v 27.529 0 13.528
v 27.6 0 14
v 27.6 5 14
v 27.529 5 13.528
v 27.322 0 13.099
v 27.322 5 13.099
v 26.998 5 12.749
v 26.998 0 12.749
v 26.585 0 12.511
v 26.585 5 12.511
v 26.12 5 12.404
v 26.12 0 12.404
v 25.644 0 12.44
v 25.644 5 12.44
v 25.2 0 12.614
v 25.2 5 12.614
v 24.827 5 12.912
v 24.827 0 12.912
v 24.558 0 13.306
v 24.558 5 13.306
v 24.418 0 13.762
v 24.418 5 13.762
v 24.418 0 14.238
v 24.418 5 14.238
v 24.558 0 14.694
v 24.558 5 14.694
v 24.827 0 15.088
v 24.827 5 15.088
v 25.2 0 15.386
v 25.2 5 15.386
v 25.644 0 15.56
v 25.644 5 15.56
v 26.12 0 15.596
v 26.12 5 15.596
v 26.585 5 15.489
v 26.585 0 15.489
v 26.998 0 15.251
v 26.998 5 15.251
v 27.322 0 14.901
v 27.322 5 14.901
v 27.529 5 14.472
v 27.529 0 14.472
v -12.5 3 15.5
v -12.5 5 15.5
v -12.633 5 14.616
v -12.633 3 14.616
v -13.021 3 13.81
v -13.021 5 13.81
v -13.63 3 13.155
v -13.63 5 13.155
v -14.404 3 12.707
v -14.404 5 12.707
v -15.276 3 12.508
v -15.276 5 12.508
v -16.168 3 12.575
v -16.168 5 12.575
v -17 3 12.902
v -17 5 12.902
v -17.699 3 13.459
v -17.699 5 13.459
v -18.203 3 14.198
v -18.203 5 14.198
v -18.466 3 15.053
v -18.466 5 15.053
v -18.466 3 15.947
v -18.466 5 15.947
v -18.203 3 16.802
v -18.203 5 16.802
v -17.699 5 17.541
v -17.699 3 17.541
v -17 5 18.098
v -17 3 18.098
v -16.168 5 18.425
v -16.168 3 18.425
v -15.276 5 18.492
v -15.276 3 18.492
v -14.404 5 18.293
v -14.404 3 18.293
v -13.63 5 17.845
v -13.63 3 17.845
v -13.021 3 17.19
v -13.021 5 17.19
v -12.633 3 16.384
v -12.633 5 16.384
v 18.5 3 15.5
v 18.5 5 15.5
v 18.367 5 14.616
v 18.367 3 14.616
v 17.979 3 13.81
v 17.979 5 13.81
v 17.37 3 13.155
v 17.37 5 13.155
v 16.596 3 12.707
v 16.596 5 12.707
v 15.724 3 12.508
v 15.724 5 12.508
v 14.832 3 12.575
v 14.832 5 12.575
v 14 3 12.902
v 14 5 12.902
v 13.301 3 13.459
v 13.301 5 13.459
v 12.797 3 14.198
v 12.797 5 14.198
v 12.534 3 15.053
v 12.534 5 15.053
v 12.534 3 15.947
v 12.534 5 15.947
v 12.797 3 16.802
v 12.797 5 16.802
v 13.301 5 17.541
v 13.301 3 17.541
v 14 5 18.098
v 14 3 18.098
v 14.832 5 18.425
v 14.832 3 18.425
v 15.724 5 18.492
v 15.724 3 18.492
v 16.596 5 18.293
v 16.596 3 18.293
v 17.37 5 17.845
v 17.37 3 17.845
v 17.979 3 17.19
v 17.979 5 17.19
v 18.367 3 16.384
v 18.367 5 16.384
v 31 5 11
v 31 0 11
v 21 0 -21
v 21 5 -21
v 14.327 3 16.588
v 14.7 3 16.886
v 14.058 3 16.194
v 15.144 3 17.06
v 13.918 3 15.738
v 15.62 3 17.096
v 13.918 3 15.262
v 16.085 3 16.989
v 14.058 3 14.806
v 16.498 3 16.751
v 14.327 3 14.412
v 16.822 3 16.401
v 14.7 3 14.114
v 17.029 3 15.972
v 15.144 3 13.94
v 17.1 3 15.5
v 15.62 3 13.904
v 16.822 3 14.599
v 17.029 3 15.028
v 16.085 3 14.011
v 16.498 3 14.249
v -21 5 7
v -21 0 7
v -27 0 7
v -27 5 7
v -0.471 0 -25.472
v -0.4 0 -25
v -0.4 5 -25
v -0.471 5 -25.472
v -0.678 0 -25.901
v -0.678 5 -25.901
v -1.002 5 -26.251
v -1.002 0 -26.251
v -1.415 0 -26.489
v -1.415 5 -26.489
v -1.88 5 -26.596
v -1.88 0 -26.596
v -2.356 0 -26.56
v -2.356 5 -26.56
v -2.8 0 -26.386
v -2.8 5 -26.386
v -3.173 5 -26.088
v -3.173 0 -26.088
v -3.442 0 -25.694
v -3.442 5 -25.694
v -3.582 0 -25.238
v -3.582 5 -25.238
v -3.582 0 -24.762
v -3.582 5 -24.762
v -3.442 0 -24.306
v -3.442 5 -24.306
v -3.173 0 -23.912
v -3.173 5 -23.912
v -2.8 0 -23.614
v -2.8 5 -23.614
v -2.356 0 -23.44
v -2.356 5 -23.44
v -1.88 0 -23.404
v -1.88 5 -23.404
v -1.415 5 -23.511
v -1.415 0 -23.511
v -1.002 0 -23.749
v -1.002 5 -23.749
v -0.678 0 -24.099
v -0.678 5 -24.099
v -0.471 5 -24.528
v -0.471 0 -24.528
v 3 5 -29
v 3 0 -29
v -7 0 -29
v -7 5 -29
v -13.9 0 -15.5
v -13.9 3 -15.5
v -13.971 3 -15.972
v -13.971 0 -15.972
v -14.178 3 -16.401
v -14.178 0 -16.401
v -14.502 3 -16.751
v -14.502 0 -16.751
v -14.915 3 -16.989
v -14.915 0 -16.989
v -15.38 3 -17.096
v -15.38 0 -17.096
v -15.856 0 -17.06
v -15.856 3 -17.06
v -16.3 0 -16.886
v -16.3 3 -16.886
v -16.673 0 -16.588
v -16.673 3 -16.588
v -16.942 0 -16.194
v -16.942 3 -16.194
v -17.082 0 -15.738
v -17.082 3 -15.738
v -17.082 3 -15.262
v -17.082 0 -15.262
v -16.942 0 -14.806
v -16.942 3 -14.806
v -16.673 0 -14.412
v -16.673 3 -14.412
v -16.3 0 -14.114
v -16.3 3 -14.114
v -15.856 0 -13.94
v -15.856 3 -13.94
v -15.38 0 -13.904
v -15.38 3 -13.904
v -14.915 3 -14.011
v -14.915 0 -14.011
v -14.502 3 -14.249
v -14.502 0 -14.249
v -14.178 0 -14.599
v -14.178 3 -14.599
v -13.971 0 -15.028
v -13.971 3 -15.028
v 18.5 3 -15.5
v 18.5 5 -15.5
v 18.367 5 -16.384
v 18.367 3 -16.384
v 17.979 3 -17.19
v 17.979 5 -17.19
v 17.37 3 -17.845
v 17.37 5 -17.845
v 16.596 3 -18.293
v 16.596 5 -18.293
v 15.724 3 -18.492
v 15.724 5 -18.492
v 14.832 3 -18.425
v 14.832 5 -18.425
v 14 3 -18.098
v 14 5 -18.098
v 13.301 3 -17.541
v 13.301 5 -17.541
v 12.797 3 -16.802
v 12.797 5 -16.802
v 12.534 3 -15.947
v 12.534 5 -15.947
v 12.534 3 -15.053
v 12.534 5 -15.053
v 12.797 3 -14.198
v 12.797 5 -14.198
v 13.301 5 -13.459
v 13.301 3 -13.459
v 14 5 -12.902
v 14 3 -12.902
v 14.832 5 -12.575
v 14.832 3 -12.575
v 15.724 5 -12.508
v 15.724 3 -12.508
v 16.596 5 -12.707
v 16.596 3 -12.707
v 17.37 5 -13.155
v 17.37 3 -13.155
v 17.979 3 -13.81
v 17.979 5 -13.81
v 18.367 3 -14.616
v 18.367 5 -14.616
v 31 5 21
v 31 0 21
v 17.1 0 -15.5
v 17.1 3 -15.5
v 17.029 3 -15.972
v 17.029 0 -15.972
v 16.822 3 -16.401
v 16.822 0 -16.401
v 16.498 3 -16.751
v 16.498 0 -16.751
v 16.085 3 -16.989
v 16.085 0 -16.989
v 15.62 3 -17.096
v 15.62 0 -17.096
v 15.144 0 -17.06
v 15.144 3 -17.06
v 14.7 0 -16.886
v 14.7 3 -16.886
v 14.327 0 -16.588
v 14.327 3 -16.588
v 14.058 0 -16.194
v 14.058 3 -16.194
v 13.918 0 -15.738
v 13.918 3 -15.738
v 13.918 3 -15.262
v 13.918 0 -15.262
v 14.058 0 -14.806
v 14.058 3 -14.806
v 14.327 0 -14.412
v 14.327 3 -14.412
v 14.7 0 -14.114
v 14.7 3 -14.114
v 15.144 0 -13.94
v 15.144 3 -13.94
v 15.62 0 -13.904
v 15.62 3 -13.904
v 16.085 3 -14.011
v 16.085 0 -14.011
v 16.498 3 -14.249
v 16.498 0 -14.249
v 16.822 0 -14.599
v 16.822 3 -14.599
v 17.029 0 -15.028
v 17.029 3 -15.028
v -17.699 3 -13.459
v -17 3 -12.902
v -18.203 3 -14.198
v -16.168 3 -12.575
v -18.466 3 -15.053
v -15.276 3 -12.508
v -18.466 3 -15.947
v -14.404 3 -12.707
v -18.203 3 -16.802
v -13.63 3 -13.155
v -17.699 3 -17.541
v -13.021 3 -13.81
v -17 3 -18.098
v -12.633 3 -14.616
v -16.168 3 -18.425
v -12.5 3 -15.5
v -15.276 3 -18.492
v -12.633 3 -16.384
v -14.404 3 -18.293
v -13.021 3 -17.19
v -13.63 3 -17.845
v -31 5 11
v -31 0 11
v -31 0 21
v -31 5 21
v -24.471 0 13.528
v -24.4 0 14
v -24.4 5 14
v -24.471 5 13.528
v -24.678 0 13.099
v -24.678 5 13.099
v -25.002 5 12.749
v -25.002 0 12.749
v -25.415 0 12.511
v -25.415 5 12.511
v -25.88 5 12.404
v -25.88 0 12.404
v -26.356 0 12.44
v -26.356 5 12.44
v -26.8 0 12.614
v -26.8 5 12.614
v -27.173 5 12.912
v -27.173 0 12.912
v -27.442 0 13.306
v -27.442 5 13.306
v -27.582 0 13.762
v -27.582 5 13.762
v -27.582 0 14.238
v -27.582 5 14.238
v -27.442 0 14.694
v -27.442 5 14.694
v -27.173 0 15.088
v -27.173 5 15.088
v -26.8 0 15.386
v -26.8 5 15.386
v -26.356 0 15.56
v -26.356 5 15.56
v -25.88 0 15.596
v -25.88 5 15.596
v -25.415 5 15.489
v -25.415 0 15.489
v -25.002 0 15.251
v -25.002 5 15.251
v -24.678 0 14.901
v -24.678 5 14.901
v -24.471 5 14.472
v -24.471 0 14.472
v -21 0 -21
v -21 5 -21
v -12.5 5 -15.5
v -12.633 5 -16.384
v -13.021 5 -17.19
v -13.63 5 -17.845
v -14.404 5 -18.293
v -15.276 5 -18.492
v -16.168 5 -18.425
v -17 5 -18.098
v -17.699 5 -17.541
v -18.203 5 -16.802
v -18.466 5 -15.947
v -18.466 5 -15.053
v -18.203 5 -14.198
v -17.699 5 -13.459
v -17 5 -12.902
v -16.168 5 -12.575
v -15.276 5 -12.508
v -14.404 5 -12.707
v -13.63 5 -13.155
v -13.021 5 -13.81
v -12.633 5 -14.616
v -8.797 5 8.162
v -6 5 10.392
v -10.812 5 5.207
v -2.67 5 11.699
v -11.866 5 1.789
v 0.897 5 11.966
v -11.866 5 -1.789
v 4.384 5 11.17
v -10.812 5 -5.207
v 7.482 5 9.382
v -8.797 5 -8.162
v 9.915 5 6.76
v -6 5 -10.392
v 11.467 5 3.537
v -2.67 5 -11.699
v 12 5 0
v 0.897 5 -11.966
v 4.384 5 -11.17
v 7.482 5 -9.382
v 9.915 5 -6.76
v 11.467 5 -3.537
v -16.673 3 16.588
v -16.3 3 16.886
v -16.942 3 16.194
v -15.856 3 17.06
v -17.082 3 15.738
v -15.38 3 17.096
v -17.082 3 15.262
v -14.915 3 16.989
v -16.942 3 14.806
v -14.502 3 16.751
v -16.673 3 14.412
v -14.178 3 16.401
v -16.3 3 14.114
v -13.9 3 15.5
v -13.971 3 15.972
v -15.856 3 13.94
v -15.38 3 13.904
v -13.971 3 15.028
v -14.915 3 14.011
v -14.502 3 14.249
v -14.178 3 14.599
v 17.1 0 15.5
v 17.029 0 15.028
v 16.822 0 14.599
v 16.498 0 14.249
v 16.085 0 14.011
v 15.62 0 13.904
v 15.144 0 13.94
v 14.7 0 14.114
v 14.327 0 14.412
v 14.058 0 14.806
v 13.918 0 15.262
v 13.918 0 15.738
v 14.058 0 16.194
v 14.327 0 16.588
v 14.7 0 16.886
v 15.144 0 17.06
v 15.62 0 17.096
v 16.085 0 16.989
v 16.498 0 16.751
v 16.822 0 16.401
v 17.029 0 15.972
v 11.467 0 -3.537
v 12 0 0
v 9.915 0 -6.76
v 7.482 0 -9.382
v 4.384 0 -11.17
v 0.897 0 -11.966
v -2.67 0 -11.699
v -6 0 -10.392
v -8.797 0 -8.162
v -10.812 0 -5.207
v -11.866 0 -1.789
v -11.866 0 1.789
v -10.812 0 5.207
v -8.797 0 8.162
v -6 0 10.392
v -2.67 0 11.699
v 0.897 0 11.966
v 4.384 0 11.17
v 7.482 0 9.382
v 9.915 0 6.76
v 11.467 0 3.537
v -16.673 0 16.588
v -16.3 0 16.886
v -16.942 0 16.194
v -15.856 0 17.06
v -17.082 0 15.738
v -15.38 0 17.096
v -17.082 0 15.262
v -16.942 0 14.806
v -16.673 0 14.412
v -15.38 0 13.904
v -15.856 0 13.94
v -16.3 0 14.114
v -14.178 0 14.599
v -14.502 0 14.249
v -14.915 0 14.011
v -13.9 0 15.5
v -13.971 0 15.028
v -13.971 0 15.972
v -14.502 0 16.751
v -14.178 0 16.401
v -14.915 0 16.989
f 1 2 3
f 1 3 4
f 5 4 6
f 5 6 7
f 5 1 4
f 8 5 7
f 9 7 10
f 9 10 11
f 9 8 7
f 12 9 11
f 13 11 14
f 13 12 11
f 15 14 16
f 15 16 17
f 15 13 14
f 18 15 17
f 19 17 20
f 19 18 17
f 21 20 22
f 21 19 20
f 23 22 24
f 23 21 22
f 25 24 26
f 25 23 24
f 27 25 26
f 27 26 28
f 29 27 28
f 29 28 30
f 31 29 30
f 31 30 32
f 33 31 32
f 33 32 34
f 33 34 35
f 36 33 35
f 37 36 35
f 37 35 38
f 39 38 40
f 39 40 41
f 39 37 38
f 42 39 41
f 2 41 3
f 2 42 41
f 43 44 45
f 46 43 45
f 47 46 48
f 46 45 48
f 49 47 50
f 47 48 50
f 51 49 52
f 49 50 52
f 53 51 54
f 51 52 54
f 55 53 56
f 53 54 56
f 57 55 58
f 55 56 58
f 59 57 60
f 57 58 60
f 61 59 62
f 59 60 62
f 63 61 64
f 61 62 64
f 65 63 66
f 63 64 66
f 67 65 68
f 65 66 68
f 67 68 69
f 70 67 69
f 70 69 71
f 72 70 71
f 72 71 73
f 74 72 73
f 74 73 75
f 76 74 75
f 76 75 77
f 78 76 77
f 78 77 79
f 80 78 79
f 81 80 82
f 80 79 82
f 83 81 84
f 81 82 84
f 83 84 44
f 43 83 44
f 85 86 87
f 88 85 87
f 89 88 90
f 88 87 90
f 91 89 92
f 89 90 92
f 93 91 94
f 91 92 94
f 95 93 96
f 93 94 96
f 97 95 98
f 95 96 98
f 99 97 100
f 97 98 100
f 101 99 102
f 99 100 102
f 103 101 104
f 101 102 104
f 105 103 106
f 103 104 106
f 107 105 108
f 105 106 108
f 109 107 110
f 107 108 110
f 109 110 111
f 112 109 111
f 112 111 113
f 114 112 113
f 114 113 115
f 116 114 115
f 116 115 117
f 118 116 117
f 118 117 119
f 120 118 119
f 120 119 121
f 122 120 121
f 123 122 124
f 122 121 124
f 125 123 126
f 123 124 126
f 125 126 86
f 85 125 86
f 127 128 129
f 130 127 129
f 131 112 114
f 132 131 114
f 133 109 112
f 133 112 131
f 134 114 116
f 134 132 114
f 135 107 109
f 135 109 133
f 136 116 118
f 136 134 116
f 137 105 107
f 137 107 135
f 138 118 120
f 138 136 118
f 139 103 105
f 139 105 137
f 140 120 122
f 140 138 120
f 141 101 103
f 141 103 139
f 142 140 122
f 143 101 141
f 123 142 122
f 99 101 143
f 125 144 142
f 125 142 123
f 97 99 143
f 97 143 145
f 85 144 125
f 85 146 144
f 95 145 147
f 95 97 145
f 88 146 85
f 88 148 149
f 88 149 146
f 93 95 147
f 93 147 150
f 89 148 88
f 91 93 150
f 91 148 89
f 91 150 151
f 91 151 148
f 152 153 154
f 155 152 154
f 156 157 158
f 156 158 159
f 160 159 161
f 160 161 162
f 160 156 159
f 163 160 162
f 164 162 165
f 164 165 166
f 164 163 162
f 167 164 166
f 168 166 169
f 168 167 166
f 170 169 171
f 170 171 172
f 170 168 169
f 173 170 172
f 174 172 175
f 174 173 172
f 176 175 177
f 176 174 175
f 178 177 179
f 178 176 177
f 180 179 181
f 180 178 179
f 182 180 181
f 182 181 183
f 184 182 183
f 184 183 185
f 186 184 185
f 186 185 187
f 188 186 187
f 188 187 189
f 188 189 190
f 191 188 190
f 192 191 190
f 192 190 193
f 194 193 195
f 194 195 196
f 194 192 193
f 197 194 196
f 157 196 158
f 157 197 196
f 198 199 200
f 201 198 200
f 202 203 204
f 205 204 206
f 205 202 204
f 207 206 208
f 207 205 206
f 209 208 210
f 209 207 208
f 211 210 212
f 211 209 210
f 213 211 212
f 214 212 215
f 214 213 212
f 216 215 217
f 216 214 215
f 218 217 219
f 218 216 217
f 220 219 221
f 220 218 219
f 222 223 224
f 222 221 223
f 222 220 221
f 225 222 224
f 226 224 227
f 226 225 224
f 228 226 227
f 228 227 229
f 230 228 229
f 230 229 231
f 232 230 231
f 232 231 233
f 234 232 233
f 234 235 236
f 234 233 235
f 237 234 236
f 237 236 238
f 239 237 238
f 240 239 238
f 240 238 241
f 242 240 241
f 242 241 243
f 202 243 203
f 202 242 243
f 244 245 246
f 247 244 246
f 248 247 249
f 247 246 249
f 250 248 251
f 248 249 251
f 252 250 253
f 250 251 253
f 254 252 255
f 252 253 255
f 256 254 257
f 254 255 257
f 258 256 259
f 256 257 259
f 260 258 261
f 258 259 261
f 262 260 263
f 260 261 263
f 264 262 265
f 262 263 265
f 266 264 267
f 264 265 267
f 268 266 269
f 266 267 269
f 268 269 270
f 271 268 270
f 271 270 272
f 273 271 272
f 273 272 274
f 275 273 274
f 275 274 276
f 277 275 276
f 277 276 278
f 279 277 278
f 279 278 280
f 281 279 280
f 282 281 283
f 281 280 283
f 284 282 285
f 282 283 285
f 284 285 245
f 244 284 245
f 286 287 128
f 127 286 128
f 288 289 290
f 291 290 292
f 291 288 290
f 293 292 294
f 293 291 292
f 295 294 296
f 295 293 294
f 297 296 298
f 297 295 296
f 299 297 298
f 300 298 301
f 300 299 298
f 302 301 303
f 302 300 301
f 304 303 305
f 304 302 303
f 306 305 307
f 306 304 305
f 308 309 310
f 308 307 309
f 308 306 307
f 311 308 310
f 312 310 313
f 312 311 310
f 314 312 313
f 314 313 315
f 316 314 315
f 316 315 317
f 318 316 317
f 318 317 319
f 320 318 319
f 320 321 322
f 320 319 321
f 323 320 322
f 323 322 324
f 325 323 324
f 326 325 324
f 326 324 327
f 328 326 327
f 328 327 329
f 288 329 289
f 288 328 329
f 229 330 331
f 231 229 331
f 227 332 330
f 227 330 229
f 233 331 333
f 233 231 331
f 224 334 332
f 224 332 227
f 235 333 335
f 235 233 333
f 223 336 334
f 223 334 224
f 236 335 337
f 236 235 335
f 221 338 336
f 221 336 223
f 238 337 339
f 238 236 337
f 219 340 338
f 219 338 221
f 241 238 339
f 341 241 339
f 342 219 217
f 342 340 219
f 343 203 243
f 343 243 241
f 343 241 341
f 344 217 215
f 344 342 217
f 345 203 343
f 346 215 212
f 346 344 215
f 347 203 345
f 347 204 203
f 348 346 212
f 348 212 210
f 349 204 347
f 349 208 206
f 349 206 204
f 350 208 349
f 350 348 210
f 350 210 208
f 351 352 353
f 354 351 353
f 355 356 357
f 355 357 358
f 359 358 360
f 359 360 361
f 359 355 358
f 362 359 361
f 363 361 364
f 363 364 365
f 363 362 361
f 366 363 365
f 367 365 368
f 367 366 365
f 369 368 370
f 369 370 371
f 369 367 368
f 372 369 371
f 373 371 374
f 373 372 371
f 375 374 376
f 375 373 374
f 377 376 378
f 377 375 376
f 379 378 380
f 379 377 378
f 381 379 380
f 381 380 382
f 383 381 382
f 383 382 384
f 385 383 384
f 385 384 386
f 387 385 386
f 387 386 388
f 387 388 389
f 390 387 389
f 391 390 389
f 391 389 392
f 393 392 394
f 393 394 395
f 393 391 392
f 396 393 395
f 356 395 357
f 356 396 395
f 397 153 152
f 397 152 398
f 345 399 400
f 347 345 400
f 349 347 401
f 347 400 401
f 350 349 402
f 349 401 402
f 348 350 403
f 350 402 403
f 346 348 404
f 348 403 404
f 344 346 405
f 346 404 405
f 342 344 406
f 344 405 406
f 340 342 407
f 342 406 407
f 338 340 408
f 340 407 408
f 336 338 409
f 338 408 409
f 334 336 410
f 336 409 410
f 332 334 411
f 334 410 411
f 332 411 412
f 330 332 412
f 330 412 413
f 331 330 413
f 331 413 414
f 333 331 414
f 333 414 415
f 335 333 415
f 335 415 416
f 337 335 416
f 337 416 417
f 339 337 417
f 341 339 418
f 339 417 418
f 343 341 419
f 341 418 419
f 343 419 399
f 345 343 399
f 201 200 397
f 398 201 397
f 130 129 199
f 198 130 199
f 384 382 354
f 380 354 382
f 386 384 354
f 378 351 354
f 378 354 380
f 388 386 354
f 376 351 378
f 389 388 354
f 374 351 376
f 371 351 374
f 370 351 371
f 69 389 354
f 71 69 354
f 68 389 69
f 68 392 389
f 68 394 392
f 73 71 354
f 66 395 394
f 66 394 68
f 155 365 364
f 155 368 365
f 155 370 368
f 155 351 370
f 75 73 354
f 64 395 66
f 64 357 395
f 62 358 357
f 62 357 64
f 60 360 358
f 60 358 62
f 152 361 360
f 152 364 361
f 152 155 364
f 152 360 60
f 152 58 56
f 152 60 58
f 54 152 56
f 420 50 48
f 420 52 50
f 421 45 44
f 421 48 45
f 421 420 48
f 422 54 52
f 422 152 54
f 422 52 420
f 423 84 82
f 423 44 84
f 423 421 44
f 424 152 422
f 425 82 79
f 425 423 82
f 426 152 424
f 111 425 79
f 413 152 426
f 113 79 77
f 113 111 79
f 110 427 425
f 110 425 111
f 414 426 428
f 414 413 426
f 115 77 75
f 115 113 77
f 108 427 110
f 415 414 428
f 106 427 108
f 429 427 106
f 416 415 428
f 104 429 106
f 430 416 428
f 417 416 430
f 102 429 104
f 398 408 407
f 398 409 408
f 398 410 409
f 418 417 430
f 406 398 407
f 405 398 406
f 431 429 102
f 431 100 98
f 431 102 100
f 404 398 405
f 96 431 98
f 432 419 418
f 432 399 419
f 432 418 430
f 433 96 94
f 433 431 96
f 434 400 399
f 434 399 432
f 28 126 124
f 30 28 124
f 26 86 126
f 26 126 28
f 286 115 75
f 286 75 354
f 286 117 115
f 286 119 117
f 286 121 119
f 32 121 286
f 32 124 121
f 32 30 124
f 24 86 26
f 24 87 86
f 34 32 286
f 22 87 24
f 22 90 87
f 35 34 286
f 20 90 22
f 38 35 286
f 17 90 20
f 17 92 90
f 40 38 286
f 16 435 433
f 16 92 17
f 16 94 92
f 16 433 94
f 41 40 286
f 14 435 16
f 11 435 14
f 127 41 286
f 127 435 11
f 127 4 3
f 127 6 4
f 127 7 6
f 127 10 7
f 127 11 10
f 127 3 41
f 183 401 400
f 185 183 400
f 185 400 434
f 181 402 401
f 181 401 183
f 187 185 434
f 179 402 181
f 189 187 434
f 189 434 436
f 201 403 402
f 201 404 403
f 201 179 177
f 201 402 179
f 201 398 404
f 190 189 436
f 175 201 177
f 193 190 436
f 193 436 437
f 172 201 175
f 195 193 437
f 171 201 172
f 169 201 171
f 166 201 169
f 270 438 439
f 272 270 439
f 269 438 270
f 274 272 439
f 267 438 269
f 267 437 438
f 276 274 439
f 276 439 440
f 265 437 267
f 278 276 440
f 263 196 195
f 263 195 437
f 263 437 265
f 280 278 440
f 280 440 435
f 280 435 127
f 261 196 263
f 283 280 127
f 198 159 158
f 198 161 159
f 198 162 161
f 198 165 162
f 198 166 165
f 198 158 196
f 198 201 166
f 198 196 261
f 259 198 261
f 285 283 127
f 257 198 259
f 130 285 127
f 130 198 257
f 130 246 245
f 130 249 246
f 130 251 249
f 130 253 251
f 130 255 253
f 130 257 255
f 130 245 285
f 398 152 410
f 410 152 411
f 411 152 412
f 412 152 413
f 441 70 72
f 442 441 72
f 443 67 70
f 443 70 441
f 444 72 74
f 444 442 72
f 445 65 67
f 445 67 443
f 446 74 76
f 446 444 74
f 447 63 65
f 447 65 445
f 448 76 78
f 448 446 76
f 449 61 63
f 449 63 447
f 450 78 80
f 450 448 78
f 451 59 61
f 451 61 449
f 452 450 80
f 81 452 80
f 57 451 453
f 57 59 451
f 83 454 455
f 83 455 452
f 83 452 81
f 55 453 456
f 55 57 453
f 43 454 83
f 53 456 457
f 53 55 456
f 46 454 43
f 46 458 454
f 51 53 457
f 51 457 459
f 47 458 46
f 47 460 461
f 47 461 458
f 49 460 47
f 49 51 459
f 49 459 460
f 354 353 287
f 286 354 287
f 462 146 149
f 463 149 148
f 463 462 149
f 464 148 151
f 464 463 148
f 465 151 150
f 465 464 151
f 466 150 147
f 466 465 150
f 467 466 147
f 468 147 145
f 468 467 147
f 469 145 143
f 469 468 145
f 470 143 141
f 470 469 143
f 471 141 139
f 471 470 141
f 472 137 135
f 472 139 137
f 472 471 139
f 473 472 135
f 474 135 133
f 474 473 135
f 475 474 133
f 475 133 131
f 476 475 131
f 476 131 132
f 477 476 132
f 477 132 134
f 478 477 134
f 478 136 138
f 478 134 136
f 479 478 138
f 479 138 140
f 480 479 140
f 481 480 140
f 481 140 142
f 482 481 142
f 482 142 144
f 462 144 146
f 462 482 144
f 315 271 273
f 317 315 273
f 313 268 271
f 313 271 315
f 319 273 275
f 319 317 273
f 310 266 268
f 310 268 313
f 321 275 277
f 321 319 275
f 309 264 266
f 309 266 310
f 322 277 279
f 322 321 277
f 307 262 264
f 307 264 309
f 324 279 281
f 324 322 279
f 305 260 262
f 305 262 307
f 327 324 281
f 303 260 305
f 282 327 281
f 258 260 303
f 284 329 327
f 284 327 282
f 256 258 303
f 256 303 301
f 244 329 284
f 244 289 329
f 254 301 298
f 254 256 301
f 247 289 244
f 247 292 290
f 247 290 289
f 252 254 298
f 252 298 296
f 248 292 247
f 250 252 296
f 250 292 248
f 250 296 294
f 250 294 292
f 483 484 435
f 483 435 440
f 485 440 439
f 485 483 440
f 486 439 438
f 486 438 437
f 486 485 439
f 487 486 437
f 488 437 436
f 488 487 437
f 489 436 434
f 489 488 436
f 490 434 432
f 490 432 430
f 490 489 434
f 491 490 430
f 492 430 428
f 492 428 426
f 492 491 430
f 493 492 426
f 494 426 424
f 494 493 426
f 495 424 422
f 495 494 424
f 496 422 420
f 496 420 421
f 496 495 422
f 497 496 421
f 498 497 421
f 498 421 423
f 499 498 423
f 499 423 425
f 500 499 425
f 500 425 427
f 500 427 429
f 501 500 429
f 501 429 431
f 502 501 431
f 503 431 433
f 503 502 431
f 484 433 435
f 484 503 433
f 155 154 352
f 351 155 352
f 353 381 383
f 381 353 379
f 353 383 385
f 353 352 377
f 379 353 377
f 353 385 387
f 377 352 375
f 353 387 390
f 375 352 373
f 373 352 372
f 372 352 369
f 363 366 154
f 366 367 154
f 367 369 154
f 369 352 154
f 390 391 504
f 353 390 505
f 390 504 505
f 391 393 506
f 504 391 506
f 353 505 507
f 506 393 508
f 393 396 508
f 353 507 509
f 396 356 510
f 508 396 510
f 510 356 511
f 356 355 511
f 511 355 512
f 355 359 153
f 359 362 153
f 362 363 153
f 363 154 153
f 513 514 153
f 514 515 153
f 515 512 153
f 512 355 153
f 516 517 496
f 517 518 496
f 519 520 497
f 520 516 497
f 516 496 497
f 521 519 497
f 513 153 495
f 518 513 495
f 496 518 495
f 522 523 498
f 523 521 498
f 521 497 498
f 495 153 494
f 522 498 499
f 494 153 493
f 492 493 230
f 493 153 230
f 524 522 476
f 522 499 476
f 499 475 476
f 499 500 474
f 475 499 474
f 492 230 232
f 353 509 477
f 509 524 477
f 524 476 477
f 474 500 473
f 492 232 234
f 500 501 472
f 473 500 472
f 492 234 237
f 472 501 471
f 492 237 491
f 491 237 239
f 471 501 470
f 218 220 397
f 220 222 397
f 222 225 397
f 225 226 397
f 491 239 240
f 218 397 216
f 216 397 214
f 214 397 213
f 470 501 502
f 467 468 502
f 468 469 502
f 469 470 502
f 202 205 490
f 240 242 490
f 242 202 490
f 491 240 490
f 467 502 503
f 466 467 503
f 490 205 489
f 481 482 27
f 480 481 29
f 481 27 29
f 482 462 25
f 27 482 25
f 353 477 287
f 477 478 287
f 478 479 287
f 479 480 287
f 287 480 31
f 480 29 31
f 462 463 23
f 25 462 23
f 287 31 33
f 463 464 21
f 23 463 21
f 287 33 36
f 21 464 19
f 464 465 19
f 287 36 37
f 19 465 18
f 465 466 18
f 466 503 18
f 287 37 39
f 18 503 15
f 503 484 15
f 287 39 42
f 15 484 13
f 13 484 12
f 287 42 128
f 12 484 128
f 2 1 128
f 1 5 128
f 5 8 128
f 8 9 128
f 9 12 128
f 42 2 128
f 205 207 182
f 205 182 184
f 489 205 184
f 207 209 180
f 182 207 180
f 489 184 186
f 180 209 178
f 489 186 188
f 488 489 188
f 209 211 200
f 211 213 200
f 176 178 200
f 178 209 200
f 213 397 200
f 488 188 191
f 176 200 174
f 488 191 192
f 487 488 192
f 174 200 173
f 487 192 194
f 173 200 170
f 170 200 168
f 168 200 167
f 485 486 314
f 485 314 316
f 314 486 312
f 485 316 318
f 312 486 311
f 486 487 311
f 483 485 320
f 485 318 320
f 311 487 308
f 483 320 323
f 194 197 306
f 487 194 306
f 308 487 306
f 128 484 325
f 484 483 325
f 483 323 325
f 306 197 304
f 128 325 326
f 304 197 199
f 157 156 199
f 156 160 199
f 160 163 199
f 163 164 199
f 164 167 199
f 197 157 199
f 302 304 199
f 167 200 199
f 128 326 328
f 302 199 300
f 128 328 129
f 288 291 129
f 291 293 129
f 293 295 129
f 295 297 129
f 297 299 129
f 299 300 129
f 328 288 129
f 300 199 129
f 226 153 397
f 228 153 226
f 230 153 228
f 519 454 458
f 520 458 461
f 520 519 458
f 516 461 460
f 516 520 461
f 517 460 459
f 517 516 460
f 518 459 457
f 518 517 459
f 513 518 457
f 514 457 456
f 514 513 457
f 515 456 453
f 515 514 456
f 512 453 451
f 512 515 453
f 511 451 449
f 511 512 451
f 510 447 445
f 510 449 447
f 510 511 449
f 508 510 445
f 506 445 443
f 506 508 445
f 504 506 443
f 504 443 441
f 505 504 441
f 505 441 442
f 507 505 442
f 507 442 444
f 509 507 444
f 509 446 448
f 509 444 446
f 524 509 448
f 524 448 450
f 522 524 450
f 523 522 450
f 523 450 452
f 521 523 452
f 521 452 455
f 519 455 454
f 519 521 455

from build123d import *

# Parameters (mm, degrees)
SKETCH1_W           = 42
SKETCH1_H           = 42
SKETCH1_R           = 12
SKETCH1_R_2         = 1.6
BOSS_EXTRUDE1_DEPTH = 5
SKETCH3_R           = 3
CUT_EXTRUDE1_DEPTH  = 2


with BuildPart() as part:
    # Sketch1 → Boss-Extrude1 (new body)
    with BuildSketch(Plane(origin=(0, 0, 0), x_dir=(1, 0, 0), z_dir=(0, 1, 0))):
        Rectangle(SKETCH1_W, SKETCH1_H)
        Circle(SKETCH1_R, mode=Mode.SUBTRACT)
        with Locations((15.5, 15.5)):
            Circle(SKETCH1_R_2, mode=Mode.SUBTRACT)
        with Locations((-15.5, 15.5)):
            Circle(SKETCH1_R_2, mode=Mode.SUBTRACT)
        with Locations((-15.5, -15.5)):
            Circle(SKETCH1_R_2, mode=Mode.SUBTRACT)
        with Locations((15.5, -15.5)):
            Circle(SKETCH1_R_2, mode=Mode.SUBTRACT)
        Polygon((-31, -21), (-21, -21), (-21, -7), (-27, -7), (-31, -11), align=None)
        with Locations((-26, -14)):
            Circle(SKETCH1_R_2, mode=Mode.SUBTRACT)
        Polygon((21, -7), (21, -21), (31, -21), (31, -11), (27, -7), align=None)
        with Locations((26, -14)):
            Circle(SKETCH1_R_2, mode=Mode.SUBTRACT)
        Polygon((-7, 29), (-11, 21), (7, 21), (3, 29), align=None)
        with Locations((-2, 25)):
            Circle(SKETCH1_R_2, mode=Mode.SUBTRACT)
        Polygon((21, 21), (21, -7), (27, -7), (31, -11), align=None)
        Polygon((-7, 29), (-21, 21), (-11, 21), align=None)
        Polygon((7, 21), (21, 21), (3, 29), align=None)
    extrude(amount=BOSS_EXTRUDE1_DEPTH)

    # Sketch3 → Cut-Extrude1 (cut)
    with BuildSketch(Plane(origin=(0, 5, 0), x_dir=(1, 0, 0), z_dir=(0, 1, 0))):
        with Locations((-15.5, 15.5)):
            Circle(SKETCH3_R)
        with Locations((15.5, 15.5)):
            Circle(SKETCH3_R)
        with Locations((15.5, -15.5)):
            Circle(SKETCH3_R)
        with Locations((-15.5, -15.5)):
            Circle(SKETCH3_R)
    extrude(amount=-CUT_EXTRUDE1_DEPTH, mode=Mode.SUBTRACT)


solid = part.part
